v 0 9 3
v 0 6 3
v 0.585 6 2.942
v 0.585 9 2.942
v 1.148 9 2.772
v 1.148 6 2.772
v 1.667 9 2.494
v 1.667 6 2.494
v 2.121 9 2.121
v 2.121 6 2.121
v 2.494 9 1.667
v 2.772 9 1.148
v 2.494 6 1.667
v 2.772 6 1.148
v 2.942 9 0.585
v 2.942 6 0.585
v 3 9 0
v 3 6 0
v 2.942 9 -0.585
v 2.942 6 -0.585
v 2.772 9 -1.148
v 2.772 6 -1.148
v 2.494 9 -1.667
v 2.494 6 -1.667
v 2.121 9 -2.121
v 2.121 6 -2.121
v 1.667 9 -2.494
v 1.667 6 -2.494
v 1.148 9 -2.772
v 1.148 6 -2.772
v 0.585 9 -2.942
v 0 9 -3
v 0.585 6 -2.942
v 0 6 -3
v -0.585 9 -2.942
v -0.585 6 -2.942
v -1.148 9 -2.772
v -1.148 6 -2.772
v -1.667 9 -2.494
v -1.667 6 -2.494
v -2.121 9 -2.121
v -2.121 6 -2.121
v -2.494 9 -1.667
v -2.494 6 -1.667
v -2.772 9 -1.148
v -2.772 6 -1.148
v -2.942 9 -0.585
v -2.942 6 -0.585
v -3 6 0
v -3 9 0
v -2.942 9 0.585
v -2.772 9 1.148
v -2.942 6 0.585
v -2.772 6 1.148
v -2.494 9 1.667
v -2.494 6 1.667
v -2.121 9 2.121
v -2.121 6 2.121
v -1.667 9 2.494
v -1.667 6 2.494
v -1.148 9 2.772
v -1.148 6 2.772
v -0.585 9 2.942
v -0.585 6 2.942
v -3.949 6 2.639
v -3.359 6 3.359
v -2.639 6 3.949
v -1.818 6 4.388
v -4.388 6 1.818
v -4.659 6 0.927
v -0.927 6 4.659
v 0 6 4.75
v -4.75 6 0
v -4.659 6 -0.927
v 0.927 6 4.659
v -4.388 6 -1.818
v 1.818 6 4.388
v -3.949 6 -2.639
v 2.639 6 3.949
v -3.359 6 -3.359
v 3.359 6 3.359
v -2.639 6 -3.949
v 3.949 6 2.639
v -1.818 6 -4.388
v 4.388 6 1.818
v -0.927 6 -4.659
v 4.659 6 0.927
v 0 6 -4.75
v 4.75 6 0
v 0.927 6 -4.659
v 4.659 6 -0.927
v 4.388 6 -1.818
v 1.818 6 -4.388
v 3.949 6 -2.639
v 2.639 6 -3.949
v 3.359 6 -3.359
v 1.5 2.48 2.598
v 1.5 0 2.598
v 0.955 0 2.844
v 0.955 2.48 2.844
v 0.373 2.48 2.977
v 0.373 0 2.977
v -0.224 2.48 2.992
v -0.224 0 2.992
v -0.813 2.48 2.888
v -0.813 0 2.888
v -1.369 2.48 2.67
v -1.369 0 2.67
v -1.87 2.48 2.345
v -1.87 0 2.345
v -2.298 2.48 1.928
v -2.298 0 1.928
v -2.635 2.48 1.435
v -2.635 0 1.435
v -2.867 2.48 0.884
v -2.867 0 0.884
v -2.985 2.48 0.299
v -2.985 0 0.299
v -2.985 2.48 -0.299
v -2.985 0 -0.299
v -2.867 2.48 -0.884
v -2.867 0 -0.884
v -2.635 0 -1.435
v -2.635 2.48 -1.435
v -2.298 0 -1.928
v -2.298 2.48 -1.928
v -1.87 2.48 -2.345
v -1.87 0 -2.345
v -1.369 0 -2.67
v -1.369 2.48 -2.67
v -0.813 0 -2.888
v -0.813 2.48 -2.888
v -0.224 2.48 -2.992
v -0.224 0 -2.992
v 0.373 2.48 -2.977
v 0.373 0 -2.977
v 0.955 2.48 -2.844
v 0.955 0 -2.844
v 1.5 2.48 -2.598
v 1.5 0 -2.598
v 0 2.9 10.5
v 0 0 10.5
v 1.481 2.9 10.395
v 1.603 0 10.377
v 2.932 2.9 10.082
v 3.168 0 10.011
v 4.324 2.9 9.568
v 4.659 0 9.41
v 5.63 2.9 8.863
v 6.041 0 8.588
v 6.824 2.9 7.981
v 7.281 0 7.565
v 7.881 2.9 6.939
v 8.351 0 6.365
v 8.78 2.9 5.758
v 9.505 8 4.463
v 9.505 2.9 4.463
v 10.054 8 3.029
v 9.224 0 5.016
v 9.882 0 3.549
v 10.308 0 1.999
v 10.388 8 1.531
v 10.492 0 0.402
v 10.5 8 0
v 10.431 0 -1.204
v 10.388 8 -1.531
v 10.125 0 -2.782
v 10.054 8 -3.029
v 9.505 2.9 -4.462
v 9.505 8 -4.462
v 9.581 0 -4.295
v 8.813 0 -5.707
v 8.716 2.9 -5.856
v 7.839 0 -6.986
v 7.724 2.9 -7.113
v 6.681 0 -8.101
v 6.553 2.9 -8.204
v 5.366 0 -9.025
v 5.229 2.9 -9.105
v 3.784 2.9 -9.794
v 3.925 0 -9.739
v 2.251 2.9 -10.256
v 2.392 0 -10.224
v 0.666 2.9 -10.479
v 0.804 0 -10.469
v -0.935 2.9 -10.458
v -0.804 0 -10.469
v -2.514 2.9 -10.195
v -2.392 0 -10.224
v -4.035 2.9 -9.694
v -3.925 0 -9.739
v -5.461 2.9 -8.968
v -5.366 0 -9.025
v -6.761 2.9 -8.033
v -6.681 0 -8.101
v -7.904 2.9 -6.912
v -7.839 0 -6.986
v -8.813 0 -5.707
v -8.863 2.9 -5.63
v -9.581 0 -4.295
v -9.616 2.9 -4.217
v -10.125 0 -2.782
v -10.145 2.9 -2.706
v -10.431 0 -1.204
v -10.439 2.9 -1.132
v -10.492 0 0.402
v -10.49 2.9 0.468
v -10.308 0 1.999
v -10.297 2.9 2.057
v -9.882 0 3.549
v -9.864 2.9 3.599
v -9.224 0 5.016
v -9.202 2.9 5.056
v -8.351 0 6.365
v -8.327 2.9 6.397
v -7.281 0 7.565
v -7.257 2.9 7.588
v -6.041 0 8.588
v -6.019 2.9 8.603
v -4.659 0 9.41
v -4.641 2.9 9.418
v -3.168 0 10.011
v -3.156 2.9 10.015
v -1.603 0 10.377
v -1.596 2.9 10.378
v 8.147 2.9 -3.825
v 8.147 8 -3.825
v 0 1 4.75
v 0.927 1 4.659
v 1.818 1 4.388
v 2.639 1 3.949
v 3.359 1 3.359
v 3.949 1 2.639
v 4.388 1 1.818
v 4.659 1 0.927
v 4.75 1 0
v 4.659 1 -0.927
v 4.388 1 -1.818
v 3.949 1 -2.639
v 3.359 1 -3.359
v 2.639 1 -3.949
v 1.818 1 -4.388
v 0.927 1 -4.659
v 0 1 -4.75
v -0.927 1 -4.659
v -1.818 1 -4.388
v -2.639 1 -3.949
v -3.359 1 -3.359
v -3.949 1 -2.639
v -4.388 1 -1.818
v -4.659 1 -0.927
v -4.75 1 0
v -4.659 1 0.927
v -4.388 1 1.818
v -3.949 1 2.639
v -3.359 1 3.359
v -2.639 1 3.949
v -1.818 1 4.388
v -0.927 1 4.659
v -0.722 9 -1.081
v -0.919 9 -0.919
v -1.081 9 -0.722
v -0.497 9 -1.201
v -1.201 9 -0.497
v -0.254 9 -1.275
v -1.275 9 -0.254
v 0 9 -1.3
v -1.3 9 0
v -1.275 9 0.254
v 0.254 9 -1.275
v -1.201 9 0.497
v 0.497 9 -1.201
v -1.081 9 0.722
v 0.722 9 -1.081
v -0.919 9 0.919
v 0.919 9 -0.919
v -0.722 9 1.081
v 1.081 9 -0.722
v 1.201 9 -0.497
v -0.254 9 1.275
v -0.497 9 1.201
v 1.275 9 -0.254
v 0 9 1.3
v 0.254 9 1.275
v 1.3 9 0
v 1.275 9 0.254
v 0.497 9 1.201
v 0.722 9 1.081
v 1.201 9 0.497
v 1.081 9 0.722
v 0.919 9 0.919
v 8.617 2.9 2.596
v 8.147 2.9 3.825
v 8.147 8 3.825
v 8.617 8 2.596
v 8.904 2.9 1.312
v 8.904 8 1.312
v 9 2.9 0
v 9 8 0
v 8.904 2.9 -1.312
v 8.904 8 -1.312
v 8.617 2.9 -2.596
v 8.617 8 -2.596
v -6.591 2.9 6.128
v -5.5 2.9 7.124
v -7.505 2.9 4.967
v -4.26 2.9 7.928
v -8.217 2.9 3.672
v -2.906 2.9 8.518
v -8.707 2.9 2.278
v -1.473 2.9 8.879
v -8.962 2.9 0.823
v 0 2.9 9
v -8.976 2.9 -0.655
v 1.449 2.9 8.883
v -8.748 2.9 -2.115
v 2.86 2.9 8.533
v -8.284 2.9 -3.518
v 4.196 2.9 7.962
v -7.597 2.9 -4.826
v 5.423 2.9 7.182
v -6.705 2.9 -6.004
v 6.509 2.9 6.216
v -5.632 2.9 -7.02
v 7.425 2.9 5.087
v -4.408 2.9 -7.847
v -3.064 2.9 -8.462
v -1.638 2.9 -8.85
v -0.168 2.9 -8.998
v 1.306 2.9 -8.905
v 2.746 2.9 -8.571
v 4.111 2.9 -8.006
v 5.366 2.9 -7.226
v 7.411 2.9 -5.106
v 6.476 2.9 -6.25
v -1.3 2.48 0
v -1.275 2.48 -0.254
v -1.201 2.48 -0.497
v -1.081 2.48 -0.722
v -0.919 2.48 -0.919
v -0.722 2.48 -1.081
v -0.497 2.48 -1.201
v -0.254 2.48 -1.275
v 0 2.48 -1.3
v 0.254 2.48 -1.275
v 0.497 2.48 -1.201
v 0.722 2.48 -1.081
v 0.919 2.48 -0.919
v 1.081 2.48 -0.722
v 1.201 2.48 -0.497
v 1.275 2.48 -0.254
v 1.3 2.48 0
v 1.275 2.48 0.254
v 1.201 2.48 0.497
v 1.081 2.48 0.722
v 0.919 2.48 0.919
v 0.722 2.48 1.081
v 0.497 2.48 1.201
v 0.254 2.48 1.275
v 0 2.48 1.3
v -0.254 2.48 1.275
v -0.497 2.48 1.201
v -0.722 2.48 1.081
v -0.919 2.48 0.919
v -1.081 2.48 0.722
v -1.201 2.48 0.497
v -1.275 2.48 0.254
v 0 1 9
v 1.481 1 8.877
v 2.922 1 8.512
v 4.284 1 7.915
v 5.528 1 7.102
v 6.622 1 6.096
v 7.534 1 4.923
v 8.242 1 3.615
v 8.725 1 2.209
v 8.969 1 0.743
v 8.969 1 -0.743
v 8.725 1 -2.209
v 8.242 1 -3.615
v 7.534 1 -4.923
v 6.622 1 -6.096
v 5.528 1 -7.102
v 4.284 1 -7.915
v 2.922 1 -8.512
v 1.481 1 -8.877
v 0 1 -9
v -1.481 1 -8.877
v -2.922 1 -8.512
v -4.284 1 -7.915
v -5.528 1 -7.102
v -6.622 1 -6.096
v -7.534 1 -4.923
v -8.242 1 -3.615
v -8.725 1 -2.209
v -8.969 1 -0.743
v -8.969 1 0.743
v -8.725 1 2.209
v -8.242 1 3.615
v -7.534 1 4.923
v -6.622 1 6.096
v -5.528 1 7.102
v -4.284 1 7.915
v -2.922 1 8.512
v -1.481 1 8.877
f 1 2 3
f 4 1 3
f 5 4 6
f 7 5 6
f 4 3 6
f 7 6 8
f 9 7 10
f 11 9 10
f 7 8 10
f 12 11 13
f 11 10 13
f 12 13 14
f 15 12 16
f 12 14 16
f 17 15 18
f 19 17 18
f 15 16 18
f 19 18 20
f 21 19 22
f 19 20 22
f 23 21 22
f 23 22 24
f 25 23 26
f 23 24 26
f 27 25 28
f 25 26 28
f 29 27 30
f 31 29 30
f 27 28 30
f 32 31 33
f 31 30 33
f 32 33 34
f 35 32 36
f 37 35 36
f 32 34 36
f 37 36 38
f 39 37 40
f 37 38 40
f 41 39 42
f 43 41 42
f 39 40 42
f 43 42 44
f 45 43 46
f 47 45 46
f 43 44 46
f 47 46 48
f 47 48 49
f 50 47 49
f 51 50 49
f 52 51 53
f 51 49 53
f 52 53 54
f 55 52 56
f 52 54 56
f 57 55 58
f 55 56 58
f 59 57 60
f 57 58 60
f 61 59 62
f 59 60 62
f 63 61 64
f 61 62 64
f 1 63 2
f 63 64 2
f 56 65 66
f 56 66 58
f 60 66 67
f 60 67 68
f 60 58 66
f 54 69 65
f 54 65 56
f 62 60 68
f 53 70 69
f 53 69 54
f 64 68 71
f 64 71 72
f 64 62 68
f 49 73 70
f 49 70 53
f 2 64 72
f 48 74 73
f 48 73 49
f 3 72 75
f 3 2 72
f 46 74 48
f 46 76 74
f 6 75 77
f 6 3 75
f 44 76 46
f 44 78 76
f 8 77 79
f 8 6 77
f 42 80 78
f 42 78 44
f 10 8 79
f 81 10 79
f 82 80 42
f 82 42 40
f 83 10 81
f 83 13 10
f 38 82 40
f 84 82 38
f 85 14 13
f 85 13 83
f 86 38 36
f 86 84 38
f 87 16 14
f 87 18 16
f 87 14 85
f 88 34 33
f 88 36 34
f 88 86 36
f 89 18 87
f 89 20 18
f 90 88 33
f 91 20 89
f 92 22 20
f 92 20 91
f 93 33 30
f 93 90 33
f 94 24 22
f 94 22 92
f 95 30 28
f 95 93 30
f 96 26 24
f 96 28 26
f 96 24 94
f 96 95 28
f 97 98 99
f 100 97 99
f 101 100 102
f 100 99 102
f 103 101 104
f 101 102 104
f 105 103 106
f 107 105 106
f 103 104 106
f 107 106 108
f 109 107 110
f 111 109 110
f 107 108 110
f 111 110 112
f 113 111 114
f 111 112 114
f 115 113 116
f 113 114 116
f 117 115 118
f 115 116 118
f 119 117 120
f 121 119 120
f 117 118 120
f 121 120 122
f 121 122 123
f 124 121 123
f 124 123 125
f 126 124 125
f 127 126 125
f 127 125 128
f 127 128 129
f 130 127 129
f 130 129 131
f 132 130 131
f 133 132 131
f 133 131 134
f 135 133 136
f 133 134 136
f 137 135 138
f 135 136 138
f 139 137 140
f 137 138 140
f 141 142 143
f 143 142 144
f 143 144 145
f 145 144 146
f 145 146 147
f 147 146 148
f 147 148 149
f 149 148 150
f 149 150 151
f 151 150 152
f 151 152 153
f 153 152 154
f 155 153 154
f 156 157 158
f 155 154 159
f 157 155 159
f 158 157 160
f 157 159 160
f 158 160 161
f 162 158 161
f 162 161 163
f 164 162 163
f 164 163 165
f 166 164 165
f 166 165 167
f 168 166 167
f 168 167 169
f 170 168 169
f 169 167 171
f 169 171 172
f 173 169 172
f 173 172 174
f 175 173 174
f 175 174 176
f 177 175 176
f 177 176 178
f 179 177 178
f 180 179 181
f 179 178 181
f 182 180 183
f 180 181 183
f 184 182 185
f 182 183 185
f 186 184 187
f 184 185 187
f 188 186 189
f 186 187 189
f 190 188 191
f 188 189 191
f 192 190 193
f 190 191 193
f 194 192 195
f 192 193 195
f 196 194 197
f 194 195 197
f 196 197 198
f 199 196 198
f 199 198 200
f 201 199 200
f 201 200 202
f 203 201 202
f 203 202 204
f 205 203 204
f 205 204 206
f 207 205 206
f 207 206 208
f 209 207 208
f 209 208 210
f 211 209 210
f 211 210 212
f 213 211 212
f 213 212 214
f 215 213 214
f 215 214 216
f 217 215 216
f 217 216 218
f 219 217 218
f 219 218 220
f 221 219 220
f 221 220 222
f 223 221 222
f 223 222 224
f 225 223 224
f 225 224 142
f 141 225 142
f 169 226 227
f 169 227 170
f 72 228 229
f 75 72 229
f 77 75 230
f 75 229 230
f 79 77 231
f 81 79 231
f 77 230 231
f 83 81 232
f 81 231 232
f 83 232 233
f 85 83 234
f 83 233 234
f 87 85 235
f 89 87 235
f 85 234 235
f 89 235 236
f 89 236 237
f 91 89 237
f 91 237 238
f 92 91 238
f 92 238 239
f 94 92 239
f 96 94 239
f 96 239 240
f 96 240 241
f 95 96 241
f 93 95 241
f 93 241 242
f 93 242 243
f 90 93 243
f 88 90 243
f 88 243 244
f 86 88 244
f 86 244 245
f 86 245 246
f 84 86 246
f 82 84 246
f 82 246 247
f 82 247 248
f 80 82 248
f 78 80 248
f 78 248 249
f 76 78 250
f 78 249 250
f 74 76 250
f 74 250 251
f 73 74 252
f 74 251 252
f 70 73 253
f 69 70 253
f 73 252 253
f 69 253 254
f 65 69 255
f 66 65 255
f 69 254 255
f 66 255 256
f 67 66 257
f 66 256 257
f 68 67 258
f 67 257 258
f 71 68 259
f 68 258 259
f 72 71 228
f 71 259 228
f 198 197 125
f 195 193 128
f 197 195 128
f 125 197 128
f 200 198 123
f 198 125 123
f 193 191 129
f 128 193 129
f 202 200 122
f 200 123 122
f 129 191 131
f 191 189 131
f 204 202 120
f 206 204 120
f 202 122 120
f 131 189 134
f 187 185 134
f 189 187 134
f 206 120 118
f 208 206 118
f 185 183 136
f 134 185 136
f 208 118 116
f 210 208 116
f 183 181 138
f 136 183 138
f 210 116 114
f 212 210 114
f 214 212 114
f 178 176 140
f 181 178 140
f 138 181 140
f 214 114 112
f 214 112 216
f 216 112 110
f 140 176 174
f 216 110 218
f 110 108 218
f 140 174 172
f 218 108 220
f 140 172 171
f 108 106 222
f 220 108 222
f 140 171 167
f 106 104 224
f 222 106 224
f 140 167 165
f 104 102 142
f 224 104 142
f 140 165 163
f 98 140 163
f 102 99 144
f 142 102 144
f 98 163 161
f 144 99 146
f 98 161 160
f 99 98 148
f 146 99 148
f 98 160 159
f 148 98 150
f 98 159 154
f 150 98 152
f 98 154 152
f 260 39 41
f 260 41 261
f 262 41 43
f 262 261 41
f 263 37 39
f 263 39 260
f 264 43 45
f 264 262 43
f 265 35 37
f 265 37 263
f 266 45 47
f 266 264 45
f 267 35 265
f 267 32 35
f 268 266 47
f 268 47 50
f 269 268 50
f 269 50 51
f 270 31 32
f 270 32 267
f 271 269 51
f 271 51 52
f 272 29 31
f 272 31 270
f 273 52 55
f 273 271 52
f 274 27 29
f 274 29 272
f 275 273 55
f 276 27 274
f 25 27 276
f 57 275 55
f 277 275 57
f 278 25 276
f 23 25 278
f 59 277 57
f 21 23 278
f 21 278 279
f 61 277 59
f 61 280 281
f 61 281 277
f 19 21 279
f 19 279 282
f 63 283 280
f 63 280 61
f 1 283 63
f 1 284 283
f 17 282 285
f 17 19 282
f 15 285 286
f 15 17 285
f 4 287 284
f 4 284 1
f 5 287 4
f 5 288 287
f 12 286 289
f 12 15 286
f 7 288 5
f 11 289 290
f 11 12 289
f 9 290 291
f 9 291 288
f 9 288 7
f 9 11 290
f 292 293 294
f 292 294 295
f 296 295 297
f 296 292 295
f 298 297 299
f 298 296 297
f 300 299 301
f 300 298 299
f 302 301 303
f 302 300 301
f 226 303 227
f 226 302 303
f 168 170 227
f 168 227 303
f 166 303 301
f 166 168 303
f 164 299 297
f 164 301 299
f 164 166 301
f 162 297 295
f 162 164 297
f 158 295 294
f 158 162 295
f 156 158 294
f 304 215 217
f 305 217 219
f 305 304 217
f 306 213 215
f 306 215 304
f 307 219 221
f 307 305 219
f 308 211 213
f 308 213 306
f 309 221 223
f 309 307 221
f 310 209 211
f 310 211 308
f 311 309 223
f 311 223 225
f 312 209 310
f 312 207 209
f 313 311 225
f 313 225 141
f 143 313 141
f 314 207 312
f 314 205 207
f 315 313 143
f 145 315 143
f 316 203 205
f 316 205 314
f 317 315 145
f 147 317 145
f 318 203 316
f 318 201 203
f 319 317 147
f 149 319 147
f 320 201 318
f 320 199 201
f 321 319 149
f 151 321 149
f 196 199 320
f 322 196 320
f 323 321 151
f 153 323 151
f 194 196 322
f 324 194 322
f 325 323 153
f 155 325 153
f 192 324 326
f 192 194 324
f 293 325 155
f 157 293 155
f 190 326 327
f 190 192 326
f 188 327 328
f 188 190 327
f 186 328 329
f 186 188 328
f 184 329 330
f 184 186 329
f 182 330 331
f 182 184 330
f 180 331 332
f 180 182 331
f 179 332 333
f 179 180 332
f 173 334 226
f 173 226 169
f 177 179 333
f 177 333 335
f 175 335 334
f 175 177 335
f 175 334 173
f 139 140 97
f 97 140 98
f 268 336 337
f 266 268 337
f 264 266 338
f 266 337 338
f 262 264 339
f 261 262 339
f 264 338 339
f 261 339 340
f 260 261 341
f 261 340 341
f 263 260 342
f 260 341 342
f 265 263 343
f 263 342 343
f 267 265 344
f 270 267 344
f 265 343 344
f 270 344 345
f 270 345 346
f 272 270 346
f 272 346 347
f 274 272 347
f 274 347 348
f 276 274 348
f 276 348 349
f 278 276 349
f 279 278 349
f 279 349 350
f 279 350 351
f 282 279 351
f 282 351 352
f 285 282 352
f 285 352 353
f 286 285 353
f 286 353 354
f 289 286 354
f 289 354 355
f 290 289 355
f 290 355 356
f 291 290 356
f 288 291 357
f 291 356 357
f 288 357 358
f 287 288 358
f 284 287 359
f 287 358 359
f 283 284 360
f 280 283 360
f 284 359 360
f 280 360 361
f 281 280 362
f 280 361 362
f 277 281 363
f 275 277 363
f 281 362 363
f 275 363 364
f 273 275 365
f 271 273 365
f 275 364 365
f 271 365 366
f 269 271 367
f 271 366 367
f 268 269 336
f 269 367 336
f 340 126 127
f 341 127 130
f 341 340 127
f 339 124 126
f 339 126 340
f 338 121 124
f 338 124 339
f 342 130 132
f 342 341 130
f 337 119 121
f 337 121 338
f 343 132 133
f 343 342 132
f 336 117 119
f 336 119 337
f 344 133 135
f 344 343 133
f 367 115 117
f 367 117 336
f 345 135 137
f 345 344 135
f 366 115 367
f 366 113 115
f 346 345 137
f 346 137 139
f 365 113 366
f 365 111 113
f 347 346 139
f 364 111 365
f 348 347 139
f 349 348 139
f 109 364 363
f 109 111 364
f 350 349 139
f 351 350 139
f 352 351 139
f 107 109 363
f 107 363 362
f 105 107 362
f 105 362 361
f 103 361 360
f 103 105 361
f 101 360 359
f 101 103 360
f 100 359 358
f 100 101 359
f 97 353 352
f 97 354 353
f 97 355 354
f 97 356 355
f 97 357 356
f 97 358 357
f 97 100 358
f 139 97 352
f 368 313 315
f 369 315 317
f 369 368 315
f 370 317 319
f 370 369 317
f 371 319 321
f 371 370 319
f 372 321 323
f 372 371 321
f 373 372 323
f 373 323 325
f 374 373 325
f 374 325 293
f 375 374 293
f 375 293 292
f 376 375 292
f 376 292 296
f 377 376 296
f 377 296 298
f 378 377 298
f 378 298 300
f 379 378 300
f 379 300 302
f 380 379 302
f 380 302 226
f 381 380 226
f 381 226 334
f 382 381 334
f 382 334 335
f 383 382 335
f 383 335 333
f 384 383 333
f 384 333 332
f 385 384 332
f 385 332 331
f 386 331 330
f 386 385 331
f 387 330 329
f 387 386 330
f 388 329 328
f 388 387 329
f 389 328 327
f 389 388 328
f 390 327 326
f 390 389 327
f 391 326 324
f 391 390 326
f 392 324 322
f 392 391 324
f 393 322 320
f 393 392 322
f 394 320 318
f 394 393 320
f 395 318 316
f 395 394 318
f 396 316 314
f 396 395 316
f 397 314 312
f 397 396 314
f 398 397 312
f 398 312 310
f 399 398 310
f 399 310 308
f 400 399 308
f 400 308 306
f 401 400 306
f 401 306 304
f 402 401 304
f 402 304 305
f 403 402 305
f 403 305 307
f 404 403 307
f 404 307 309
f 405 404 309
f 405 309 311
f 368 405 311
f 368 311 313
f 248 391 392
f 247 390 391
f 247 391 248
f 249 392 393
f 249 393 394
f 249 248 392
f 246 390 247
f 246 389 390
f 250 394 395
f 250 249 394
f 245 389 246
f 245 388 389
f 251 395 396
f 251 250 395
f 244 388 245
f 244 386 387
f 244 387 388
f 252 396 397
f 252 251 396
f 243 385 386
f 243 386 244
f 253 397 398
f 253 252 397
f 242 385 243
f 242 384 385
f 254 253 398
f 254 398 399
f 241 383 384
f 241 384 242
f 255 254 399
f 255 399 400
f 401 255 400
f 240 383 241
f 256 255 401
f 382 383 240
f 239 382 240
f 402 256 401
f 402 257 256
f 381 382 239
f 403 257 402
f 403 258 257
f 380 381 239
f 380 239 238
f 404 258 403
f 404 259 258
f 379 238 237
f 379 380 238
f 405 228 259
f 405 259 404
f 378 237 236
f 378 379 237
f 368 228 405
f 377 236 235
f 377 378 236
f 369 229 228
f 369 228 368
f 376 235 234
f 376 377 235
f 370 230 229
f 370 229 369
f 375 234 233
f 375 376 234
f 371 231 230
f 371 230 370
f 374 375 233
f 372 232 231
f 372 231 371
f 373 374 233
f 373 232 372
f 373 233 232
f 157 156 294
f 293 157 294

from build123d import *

# Parameters (mm, degrees)
SCHIZZO2_R                   = 10.5
ESTRUSIONE_ESTRUSIONE1_DEPTH = 8
TAGLIO_ESTRUSIONE1_START     = -2
TAGLIO_ESTRUSIONE1_DEPTH     = 2
TAGLIO_ESTRUSIONE2_START     = -3.1
SCHIZZO4_R                   = 4.75
TAGLIO_ESTRUSIONE2_DEPTH     = 3.1
TAGLIO_ESTRUSIONE4_START     = -1.9
SCHIZZO5_R                   = 9
SCHIZZO5_R_2                 = 4.75
TAGLIO_ESTRUSIONE4_DEPTH     = 1.9
SCHIZZO6_R                   = 3
ESTRUSIONE_ESTRUSIONE2_DEPTH = 3
TAGLIO_ESTRUSIONE5_DEPTH     = 2.48
FORO_PER_VITE_M2_1_D         = 2.6


with BuildPart() as part:
    # Schizzo2 → Estrusione-Estrusione1 (new body)
    with BuildSketch(Plane(origin=(0, 0, 0), x_dir=(1, 0, 0), z_dir=(0, 1, 0))):
        with Locations(Location((0, 0, 0), (0, 0, 270))):
            Circle(SCHIZZO2_R)
    extrude(amount=ESTRUSIONE_ESTRUSIONE1_DEPTH)

    # Schizzo3 → Taglio-Estrusione1 (cut)
    with BuildSketch(Plane(origin=(0, 8, 0), x_dir=(1, 0, 0), z_dir=(0, 1, 0)).offset(TAGLIO_ESTRUSIONE1_START)):
        with BuildLine():
            Line((8.146740146, 3.825), (9.50453017, 4.4625))
            ThreePointArc((9.50453017, 4.4625), (-10.5, 0), (9.50453017, -4.4625))
            Line((9.50453017, -4.4625), (8.146740146, -3.825))
            ThreePointArc((8.146740146, -3.825), (9, 0), (8.146740146, 3.825))
        make_face()
    extrude(amount=TAGLIO_ESTRUSIONE1_DEPTH, mode=Mode.SUBTRACT)

    # Schizzo4 → Taglio-Estrusione2 (cut)
    with BuildSketch(Plane(origin=(0, 6, 0), x_dir=(1, 0, 0), z_dir=(0, 1, 0)).offset(TAGLIO_ESTRUSIONE2_START)):
        with BuildLine():
            Line((8.146740146, 3.825), (9.50453017, 4.4625))
            ThreePointArc((9.50453017, 4.4625), (-10.5, 0), (9.50453017, -4.4625))
            Line((9.50453017, -4.4625), (8.146740146, -3.825))
            ThreePointArc((8.146740146, -3.825), (9, 0), (8.146740146, 3.825))
        make_face()
        with Locations(Location((0, 0, 0), (0, 0, 270))):
            Circle(SCHIZZO4_R, mode=Mode.SUBTRACT)
    extrude(amount=TAGLIO_ESTRUSIONE2_DEPTH, mode=Mode.SUBTRACT)

    # Schizzo5 → Taglio-Estrusione4 (cut)
    with BuildSketch(Plane(origin=(0, 2.9, 0), x_dir=(1, 0, 0), z_dir=(0, 1, 0)).offset(TAGLIO_ESTRUSIONE4_START)):
        with Locations(Location((0, 0, 0), (0, 0, 270))):
            Circle(SCHIZZO5_R)
        with Locations(Location((0, 0, 0), (0, 0, 270))):
            Circle(SCHIZZO5_R_2, mode=Mode.SUBTRACT)
    extrude(amount=TAGLIO_ESTRUSIONE4_DEPTH, mode=Mode.SUBTRACT)

    # Schizzo6 → Estrusione-Estrusione2 (add)
    with BuildSketch(Plane(origin=(0, 6, 0), x_dir=(1, 0, 0), z_dir=(0, 1, 0))):
        with Locations(Location((0, 0, 0), (0, 0, 270))):
            Circle(SCHIZZO6_R)
    extrude(amount=ESTRUSIONE_ESTRUSIONE2_DEPTH)

    # Schizzo7 → Taglio-Estrusione5 (cut)
    with BuildSketch(Plane.XZ):
        with BuildLine():
            Line((1.5, -2.598076211), (1.5, 2.598076211))
            ThreePointArc((1.5, 2.598076211), (-3, 0), (1.5, -2.598076211))
        make_face()
    extrude(amount=-TAGLIO_ESTRUSIONE5_DEPTH, mode=Mode.SUBTRACT)

    # Foro per Vite M2-1 (through all)
    with Locations(Plane(origin=(0, 9, 0), x_dir=(1, 0, 0), z_dir=(0, 1, 0))):
        with Locations((0, 0)):
            Hole(FORO_PER_VITE_M2_1_D / 2)


solid = part.part
